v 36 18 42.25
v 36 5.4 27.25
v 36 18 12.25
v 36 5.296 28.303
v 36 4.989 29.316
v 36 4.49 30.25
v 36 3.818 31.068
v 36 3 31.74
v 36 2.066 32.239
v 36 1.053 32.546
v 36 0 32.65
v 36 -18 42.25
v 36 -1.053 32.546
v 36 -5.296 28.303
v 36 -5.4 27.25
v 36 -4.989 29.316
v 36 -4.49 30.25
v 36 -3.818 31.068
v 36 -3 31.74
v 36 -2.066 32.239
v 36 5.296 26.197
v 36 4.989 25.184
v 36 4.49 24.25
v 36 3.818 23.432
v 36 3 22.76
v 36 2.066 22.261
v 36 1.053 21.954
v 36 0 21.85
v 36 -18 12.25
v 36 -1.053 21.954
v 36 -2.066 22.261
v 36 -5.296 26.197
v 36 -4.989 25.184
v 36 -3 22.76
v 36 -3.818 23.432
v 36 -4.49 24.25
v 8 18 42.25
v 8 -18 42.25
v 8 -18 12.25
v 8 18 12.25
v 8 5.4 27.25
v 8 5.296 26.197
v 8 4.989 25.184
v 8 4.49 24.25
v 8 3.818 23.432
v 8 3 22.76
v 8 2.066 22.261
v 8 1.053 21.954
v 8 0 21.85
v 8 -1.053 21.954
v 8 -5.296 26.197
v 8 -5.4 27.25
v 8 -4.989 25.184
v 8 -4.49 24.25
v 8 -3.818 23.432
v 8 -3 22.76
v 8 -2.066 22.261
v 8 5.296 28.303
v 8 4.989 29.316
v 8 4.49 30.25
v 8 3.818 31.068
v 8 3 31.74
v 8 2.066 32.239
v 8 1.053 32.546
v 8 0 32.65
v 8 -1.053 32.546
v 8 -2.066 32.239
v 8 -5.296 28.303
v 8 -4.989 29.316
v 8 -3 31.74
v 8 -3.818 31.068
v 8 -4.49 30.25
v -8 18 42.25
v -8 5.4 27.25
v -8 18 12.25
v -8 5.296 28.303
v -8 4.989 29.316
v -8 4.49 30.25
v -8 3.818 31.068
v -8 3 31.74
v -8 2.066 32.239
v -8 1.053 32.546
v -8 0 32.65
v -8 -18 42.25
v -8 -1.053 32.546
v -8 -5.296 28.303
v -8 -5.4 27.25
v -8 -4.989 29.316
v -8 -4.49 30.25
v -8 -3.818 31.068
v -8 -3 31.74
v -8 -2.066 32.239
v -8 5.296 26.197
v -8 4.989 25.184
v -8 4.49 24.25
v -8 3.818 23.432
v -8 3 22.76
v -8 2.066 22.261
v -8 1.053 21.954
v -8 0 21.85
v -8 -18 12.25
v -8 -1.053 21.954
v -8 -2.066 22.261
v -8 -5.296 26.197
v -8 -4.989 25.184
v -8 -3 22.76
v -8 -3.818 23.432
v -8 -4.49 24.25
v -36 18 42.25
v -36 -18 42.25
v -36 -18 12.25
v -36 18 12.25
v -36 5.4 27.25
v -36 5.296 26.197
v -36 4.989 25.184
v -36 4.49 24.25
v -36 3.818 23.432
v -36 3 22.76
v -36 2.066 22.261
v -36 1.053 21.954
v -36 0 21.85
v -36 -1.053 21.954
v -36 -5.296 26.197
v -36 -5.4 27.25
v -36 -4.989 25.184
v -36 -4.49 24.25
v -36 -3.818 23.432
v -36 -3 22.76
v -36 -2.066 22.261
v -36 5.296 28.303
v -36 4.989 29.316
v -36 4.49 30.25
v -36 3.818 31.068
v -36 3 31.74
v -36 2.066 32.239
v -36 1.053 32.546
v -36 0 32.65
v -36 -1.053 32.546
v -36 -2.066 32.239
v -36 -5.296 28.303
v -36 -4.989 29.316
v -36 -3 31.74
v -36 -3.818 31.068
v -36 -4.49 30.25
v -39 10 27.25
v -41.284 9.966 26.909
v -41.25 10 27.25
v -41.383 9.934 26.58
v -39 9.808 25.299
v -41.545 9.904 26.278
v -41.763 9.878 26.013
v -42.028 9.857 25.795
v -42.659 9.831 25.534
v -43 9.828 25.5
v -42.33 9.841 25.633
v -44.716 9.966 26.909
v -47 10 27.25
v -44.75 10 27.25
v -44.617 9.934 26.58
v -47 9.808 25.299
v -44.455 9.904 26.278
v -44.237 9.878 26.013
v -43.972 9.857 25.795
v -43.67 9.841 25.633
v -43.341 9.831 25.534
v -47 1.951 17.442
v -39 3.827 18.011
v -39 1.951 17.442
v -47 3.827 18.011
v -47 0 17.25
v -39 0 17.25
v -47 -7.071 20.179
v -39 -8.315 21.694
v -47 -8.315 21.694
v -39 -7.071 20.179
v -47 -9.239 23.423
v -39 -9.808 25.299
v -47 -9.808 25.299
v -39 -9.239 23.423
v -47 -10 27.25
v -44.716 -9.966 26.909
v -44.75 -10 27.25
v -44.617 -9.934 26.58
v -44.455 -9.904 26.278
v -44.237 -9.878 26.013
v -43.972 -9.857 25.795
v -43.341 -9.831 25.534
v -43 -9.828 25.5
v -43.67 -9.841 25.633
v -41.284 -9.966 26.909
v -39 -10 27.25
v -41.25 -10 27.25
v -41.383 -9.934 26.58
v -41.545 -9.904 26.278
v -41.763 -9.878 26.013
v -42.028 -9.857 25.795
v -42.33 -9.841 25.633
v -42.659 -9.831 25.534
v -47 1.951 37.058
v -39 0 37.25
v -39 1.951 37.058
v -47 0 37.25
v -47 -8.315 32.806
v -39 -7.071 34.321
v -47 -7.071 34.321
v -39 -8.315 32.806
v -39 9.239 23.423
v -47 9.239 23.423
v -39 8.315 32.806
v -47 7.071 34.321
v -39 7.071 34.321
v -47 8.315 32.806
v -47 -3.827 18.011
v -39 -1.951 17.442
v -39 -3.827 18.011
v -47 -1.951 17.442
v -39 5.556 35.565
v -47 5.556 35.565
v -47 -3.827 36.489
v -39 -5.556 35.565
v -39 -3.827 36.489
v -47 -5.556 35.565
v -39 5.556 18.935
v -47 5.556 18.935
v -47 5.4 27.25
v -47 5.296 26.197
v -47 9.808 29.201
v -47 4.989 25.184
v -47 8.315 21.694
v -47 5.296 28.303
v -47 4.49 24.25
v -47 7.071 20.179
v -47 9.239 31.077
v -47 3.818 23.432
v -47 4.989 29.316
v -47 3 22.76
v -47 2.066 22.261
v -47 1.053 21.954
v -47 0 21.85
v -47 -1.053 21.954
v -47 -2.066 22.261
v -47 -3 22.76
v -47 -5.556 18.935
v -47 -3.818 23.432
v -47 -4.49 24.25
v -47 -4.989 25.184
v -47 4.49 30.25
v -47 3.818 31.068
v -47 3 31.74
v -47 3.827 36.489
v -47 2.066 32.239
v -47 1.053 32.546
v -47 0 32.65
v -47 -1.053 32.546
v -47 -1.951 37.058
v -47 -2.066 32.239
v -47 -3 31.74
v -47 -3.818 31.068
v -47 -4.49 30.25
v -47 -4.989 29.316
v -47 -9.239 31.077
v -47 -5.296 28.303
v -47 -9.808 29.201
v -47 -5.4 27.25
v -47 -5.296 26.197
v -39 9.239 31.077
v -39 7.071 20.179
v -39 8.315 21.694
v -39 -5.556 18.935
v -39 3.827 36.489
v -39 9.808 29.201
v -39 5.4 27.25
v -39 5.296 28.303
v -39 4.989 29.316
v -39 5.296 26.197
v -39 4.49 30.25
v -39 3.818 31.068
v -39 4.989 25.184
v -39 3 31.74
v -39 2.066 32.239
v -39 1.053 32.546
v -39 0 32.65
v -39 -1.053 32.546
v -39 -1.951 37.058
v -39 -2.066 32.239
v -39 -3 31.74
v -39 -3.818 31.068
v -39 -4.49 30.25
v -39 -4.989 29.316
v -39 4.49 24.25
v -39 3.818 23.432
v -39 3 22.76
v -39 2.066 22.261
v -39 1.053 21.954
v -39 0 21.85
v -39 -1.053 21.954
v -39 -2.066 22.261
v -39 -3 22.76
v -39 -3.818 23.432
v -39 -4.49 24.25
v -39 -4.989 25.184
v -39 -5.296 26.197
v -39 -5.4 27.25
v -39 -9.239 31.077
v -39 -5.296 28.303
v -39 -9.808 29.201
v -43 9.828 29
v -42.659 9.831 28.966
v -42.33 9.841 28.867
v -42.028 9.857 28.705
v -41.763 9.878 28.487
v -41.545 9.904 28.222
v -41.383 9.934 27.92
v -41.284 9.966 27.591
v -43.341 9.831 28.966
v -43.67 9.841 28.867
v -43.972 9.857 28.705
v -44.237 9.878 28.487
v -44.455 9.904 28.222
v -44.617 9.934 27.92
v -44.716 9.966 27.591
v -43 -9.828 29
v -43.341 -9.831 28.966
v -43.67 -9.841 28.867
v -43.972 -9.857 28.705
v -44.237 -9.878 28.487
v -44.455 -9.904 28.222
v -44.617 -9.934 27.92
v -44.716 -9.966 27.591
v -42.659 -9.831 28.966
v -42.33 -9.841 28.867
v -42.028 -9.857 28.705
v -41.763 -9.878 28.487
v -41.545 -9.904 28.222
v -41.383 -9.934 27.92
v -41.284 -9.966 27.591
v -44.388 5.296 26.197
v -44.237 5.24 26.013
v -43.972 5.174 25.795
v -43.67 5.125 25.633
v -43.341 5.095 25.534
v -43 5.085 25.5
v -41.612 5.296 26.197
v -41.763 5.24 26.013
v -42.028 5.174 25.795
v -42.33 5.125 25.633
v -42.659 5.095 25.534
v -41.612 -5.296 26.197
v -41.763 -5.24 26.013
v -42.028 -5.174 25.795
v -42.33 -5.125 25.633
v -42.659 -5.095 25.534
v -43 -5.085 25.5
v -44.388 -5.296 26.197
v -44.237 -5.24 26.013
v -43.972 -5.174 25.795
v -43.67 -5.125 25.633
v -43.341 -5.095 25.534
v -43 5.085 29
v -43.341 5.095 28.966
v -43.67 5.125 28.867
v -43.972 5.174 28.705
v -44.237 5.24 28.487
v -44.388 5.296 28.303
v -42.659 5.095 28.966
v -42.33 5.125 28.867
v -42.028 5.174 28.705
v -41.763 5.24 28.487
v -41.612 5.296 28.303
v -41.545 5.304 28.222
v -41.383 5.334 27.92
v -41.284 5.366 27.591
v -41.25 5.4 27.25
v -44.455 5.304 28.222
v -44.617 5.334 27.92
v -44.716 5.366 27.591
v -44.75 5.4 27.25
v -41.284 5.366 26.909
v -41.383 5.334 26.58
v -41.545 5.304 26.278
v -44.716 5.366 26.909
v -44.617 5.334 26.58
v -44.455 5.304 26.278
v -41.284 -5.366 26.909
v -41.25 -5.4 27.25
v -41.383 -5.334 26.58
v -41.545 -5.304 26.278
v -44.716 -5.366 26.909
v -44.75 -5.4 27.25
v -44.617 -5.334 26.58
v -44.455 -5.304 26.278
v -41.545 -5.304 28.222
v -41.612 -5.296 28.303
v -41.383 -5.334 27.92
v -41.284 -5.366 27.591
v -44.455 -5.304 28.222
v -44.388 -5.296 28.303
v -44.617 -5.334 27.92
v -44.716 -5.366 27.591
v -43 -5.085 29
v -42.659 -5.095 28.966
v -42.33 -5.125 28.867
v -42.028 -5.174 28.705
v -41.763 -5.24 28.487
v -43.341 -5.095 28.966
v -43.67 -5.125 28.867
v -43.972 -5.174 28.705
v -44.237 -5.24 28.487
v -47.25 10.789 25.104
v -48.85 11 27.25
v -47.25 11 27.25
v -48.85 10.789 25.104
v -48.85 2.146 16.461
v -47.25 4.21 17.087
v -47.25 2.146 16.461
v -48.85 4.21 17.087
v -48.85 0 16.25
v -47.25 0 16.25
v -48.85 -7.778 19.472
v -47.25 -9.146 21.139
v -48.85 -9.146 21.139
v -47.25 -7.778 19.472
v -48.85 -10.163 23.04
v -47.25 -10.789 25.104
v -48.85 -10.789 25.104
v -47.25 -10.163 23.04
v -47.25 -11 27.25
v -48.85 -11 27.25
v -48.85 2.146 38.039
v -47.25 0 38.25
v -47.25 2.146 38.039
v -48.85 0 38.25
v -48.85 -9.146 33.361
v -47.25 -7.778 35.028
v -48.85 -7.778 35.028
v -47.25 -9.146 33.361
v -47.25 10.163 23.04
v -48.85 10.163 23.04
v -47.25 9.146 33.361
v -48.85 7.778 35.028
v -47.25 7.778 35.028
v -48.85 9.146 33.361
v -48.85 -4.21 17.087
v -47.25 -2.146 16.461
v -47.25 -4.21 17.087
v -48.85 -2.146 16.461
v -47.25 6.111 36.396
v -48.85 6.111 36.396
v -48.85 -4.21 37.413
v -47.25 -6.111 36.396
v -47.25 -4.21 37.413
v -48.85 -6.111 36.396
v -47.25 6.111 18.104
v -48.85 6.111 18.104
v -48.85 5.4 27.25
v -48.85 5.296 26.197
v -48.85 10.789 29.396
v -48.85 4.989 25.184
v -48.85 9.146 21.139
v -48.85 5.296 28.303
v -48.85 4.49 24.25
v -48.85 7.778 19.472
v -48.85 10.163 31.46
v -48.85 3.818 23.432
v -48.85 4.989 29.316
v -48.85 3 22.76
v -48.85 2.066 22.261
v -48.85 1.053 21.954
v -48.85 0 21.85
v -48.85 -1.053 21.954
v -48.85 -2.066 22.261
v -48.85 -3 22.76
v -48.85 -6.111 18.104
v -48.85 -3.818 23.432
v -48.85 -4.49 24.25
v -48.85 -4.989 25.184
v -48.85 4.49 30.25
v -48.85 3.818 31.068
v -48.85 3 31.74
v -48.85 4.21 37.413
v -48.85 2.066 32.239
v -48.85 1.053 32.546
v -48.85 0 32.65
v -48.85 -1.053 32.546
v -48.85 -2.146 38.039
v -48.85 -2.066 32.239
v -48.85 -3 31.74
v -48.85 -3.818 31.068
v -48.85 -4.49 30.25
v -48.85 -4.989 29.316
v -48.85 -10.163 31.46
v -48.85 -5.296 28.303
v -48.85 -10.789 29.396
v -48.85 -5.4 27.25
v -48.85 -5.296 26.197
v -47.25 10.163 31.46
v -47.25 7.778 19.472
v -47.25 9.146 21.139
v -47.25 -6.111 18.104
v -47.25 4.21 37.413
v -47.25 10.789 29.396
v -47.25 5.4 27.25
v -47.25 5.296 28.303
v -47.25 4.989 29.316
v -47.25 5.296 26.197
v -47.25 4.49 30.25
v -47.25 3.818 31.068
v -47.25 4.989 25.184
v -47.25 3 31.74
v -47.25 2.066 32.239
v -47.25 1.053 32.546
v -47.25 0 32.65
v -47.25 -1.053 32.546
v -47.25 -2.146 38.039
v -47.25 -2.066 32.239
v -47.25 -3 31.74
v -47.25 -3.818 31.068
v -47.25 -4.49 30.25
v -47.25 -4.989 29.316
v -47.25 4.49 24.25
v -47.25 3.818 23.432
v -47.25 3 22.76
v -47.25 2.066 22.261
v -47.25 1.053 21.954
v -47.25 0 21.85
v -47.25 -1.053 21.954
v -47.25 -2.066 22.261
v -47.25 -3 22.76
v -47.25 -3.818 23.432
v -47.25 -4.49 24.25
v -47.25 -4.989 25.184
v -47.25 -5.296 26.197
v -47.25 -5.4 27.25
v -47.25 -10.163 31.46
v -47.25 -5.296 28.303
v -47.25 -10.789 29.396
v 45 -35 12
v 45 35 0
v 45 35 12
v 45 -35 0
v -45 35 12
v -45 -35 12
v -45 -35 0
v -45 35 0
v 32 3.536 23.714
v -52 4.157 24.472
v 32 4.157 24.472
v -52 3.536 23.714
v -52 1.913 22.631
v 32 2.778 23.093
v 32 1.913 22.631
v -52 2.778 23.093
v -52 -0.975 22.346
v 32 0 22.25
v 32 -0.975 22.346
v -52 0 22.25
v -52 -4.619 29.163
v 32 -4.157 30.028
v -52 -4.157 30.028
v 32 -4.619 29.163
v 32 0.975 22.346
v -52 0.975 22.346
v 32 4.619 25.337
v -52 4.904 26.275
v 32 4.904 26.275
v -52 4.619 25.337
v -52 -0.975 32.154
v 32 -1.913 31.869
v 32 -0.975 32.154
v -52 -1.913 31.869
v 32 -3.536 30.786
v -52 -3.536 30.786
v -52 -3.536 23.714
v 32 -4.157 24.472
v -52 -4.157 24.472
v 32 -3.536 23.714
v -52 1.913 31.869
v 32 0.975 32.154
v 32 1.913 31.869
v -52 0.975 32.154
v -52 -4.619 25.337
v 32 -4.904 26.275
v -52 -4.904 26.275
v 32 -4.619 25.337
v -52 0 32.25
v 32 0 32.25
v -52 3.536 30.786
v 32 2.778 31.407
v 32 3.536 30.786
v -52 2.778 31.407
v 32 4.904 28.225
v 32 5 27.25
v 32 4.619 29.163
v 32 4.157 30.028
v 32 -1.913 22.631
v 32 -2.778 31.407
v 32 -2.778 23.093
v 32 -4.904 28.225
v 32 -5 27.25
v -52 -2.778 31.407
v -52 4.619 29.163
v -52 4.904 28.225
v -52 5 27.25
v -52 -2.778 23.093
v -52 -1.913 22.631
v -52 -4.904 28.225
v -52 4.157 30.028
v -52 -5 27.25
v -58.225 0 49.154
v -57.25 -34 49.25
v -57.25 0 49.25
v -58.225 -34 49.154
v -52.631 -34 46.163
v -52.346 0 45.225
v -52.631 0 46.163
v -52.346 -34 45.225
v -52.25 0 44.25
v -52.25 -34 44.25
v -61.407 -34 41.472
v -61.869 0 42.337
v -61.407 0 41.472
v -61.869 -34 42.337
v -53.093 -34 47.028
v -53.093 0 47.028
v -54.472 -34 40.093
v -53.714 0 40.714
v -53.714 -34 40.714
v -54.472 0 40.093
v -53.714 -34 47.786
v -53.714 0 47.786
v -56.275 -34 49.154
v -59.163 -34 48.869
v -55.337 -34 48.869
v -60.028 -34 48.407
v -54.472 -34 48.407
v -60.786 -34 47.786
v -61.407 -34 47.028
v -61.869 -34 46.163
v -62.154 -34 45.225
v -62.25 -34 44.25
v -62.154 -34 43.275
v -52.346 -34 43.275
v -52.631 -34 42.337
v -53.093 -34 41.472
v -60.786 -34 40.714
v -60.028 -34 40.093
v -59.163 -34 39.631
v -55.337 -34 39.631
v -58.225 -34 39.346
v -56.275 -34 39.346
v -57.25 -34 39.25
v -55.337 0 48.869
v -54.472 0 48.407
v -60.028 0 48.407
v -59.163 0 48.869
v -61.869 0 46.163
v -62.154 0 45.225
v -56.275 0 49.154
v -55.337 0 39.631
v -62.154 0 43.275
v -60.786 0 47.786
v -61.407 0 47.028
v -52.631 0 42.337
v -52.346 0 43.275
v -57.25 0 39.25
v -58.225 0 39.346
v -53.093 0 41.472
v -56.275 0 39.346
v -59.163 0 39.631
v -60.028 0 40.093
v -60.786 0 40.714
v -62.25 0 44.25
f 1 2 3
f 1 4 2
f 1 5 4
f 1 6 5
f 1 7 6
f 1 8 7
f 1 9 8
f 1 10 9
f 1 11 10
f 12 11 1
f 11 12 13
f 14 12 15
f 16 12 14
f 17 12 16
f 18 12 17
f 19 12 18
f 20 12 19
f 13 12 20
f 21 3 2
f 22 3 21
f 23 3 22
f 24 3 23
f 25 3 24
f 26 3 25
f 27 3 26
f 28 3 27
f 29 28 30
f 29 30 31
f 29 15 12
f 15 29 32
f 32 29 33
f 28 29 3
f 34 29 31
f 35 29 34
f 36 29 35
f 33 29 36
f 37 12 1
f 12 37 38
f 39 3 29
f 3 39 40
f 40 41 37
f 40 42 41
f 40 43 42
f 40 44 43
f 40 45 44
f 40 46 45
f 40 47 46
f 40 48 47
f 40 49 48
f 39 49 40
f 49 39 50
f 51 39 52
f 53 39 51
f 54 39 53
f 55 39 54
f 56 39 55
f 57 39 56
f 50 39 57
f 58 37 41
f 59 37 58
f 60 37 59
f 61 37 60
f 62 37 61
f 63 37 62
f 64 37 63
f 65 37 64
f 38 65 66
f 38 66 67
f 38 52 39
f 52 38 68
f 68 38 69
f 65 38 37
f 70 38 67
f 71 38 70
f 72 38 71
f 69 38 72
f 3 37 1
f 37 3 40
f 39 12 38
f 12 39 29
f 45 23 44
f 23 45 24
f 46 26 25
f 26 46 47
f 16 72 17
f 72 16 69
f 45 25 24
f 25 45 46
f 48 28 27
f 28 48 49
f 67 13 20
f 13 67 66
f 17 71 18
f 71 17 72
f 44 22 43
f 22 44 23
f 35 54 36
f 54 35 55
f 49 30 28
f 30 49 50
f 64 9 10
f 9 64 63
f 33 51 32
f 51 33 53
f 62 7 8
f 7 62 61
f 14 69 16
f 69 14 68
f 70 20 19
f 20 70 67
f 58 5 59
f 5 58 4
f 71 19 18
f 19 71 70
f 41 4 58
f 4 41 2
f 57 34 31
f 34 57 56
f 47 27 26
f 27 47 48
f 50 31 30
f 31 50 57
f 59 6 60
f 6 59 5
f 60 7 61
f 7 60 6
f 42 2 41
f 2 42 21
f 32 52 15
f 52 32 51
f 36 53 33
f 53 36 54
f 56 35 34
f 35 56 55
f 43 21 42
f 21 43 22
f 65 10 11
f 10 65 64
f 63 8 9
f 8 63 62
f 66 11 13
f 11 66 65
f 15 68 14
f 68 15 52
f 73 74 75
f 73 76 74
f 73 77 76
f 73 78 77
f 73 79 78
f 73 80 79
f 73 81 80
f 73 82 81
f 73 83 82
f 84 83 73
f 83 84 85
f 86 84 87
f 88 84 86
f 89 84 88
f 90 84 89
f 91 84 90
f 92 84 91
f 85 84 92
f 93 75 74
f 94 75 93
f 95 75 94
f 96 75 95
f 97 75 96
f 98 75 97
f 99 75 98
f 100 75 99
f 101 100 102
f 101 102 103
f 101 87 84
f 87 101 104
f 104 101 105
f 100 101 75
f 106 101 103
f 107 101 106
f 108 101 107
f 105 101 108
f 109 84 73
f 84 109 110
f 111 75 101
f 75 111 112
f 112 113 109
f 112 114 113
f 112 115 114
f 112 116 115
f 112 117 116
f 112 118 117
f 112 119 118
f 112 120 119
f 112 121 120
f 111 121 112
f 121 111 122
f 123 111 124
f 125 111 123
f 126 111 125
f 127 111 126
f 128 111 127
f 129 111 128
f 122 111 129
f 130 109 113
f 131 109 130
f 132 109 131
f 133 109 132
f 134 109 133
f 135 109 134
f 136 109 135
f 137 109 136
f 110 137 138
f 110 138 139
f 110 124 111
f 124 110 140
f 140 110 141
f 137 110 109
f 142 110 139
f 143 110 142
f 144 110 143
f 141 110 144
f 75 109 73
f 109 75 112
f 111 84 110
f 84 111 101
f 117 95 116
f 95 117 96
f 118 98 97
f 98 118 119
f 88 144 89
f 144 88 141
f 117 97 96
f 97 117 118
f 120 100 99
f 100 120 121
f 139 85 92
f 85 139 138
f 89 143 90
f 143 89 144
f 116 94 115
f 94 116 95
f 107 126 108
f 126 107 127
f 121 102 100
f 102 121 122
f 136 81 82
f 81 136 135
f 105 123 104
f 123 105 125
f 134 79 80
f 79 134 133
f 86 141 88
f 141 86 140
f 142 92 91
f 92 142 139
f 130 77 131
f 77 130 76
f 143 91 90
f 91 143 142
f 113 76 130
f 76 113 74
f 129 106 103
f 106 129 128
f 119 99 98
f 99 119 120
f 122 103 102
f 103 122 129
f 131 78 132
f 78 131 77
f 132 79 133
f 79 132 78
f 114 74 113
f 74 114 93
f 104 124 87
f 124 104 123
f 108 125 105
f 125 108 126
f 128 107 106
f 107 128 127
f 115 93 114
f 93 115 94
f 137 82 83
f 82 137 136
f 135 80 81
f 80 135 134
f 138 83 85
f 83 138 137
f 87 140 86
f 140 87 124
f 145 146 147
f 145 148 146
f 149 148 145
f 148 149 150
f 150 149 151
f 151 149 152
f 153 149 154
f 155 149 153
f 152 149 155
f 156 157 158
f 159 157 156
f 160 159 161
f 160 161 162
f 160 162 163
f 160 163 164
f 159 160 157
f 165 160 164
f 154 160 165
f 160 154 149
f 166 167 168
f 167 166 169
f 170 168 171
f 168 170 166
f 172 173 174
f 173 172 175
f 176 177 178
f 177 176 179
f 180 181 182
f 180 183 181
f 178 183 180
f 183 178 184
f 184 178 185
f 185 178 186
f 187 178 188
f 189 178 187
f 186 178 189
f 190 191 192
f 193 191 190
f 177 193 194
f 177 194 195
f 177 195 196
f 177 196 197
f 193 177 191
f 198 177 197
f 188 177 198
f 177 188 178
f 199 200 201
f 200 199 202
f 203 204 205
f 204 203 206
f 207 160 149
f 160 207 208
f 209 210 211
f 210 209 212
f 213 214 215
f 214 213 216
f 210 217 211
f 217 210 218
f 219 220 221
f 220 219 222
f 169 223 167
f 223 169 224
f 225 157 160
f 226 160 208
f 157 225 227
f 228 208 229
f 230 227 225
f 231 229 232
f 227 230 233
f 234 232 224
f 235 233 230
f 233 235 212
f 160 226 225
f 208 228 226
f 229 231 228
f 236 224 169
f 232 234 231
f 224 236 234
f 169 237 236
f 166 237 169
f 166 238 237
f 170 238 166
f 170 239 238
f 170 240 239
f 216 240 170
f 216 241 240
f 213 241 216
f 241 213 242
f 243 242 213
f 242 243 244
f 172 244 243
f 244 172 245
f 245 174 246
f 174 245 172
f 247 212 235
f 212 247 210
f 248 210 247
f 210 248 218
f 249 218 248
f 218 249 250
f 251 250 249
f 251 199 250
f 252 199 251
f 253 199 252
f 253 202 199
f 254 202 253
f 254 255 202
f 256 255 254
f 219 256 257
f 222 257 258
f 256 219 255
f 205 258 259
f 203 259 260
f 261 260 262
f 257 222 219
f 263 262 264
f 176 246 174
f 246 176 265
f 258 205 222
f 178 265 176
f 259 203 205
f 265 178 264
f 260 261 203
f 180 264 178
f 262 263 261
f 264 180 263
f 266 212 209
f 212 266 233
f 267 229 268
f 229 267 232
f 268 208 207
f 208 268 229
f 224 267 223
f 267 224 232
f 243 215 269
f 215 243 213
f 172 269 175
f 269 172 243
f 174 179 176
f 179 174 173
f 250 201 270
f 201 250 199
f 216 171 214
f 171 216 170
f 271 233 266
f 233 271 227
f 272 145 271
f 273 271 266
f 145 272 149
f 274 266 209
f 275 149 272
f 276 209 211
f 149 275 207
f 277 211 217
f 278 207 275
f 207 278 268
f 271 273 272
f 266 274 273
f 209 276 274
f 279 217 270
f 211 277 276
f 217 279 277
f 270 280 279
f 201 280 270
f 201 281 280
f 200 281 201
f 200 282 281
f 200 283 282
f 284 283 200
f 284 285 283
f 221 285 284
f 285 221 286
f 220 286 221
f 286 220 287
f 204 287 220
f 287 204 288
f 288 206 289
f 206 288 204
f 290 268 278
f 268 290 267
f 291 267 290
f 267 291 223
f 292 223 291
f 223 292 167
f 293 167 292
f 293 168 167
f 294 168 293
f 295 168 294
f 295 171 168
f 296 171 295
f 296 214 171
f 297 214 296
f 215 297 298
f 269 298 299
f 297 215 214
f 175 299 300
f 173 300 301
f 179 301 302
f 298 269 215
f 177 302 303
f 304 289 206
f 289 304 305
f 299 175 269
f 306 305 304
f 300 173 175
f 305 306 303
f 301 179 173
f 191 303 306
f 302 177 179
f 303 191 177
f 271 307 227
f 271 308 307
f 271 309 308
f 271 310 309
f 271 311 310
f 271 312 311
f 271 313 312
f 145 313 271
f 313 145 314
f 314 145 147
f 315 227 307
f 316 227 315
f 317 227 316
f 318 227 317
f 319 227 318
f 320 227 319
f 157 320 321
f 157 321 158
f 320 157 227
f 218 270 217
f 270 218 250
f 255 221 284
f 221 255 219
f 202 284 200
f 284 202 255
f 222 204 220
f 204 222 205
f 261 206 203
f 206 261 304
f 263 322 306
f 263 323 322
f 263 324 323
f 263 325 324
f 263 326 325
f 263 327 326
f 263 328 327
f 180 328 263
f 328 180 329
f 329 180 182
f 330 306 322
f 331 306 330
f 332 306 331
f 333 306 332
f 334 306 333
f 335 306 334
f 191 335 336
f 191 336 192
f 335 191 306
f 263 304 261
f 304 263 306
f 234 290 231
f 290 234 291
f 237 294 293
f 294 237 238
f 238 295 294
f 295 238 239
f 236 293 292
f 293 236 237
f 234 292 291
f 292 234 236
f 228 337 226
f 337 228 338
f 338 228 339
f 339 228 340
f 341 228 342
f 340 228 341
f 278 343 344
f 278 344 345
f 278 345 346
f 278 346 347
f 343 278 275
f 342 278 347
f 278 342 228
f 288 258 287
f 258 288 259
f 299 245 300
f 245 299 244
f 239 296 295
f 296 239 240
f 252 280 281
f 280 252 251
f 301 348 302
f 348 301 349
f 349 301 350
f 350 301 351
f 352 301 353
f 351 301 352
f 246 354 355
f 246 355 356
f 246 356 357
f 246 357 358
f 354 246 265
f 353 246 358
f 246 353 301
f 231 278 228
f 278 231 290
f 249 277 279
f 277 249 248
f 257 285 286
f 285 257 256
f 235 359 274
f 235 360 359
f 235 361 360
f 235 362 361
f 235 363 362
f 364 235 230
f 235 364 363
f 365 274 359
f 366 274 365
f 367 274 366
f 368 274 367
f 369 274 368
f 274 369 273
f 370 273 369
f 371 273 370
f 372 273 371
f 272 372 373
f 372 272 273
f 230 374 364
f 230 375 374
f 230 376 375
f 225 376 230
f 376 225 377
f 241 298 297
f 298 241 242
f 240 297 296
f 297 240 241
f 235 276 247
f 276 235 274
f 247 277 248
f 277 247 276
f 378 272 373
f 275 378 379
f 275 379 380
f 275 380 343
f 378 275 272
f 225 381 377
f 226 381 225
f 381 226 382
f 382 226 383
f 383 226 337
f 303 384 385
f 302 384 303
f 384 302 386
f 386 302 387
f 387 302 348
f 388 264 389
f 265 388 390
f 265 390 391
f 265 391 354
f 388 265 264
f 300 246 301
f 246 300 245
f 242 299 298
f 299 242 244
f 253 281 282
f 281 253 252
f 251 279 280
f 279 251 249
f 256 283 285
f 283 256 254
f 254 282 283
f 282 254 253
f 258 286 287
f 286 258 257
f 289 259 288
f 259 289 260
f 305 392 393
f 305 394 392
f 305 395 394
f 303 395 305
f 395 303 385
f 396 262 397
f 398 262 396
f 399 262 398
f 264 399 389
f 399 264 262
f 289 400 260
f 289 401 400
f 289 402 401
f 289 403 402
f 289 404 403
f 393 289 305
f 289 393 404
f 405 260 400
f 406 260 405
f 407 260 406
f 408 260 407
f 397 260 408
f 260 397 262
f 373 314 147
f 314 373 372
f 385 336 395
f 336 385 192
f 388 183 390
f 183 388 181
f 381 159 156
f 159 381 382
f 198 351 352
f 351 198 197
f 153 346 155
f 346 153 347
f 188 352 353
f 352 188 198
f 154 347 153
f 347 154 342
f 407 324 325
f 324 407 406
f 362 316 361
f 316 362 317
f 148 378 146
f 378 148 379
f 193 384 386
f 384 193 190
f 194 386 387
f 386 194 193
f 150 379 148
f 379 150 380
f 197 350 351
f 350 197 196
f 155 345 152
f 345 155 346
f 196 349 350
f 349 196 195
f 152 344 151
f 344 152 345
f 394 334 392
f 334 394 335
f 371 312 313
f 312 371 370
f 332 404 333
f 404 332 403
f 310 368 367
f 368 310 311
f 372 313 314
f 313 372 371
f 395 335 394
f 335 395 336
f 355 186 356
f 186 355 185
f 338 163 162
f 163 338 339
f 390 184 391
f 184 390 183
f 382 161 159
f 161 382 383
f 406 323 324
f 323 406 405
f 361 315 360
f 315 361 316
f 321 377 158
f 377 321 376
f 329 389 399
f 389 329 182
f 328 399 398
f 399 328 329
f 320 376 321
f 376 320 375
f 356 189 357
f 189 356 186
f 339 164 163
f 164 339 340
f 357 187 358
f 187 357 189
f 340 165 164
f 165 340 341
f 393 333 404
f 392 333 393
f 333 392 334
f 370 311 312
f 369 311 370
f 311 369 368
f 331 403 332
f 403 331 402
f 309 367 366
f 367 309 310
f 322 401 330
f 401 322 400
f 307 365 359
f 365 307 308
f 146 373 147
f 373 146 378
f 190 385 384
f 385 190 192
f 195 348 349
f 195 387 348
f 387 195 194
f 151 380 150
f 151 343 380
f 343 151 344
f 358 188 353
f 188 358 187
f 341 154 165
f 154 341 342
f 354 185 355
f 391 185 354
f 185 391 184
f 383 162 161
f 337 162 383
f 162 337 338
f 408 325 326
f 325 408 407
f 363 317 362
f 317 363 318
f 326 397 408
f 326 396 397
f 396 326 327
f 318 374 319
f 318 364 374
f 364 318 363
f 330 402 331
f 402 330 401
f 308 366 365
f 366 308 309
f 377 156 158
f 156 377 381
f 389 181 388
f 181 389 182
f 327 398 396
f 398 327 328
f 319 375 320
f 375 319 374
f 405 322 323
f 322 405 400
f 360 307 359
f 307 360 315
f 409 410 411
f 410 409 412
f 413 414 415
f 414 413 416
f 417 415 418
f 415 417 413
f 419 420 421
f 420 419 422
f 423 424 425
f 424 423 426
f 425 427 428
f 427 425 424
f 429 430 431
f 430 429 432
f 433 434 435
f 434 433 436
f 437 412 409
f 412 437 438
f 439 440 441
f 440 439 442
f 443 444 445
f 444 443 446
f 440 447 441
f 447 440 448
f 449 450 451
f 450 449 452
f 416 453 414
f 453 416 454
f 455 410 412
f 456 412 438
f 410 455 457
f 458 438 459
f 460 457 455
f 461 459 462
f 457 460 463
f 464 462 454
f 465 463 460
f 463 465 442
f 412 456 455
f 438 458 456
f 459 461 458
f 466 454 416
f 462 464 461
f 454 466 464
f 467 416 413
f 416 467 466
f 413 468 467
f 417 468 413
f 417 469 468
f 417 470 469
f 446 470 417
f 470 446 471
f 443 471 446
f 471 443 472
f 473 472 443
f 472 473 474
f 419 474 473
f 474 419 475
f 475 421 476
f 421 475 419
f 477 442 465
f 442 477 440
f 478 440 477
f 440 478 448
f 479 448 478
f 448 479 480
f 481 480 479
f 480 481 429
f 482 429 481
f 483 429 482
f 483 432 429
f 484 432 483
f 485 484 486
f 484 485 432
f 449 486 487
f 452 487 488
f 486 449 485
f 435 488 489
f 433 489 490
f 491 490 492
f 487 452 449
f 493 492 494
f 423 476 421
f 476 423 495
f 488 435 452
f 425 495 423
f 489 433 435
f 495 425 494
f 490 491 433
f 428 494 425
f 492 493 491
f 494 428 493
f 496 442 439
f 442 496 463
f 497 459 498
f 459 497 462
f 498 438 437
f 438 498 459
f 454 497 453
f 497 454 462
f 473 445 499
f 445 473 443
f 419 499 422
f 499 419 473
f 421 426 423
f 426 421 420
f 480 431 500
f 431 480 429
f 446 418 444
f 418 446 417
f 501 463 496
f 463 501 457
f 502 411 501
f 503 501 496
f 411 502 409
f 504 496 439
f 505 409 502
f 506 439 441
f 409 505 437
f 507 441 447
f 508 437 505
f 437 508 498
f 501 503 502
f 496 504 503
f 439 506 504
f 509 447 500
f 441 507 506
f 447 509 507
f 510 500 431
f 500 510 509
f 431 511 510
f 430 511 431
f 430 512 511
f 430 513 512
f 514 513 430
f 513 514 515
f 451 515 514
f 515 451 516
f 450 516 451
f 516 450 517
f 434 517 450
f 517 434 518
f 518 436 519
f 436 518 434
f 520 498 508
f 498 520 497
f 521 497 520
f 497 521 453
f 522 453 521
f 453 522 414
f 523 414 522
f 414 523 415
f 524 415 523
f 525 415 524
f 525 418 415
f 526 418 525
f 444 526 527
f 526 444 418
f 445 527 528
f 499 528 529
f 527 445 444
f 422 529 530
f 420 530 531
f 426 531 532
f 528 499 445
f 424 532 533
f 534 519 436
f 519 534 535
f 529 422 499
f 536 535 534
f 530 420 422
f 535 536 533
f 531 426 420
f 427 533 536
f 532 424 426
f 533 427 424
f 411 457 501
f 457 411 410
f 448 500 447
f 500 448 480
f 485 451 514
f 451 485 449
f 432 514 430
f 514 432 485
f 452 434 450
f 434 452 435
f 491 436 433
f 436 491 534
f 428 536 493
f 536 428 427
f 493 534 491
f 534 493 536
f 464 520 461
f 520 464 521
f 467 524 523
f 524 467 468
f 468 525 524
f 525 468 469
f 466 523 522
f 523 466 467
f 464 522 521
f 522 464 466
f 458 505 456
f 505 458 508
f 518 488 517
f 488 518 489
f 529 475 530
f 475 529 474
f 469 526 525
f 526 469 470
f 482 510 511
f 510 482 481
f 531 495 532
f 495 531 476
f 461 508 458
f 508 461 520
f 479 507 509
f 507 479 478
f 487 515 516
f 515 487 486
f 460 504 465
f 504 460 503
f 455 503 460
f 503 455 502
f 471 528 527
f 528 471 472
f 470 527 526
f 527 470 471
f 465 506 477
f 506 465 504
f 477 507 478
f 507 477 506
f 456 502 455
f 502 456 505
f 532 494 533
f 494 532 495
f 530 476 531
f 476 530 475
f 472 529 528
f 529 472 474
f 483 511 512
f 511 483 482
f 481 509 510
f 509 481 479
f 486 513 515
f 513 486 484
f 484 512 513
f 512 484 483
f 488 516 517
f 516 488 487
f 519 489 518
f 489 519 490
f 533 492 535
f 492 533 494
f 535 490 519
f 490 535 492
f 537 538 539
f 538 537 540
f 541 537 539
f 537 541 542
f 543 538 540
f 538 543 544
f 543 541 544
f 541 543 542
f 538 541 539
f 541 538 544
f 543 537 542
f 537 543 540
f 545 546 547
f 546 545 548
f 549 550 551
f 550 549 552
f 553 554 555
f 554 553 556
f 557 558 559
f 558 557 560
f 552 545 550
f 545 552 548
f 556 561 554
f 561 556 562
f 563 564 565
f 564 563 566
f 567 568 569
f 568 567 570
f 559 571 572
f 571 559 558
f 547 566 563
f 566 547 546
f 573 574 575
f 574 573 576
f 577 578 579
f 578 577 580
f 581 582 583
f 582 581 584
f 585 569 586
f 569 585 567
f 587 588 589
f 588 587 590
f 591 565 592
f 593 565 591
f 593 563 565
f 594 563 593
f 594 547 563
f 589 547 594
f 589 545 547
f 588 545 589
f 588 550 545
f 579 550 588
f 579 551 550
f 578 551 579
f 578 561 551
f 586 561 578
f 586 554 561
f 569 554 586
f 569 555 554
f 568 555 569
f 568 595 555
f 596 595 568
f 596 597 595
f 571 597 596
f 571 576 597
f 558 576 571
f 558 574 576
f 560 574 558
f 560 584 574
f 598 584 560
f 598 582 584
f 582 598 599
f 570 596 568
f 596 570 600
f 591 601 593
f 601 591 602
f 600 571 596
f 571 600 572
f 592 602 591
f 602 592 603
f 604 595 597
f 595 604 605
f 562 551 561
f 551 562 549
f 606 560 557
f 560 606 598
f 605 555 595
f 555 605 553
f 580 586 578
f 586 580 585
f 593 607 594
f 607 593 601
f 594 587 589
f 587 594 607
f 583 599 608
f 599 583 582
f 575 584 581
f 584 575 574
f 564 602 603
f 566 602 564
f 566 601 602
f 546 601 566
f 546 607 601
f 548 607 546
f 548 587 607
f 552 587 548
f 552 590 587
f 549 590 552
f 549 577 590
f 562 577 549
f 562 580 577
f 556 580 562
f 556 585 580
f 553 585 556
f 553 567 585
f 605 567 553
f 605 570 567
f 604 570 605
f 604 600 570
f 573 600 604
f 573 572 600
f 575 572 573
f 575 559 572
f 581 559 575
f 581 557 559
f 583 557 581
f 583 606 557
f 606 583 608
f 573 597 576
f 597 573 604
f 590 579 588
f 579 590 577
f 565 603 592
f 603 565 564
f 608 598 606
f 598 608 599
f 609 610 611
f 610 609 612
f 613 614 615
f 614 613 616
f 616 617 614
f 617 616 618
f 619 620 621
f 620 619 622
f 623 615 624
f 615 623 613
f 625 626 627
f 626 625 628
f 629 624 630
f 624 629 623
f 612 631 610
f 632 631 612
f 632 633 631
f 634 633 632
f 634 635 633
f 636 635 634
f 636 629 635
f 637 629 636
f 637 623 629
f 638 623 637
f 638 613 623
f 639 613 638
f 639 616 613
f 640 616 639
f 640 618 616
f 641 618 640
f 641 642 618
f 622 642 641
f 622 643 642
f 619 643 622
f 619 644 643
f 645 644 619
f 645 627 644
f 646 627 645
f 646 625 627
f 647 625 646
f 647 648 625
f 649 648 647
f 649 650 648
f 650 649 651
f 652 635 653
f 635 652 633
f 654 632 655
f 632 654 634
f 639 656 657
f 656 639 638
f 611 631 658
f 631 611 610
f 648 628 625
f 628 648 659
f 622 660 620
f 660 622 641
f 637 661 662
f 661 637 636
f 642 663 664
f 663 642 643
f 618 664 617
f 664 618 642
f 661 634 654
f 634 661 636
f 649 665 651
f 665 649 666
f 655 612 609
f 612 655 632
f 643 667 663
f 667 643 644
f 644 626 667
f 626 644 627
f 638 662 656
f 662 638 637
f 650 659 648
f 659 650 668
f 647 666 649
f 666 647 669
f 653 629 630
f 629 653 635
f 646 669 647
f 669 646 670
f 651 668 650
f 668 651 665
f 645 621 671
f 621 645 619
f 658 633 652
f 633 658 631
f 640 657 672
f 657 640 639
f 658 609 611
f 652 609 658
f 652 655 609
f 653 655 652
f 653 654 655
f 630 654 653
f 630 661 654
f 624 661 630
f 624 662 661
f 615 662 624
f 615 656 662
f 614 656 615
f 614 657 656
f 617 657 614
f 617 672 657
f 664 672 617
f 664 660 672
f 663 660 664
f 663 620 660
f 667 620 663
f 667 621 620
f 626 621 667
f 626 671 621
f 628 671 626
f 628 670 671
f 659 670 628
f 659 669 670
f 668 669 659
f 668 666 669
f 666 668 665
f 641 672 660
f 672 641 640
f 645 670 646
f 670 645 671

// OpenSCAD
$fn = 32;

// ------------------------------------------------------------------------
// Machine vise: screw d10, jaws 28 x 30 mm
// Every part is its own module, assembly() places every instance.
// ------------------------------------------------------------------------

// --- part 1 ---
module vise_bed() {
  difference() {
    translate([-45, -35, 0]) cube([90, 70, 12]);
  }
}

// --- part 2 ---
module vise_jaw() {
  difference() {
    translate([-14, -18, 0]) cube([28, 36, 30]);
    translate([0, 0, 15]) rotate([0, 90, 0]) cylinder(h = 30, d = 10.8, center = true);
  }
}

// --- part 3 ---
module vise_screw() {
  translate([0, 0, -42]) cylinder(h = 84, d = 10);
}

// --- part 4 ---
module screw_collar() {
  difference() {
    cylinder(h = 8, d = 20);
    translate([0, 0, -1]) cylinder(h = 10, d = 10.8);
    translate([0, 0, 4]) rotate([90, 0, 0]) cylinder(h = 22, d = 3.5, center = true);
  }
}

// --- part 5 ---
module screw_washer() {
  difference() {
      translate([0, 0, 0]) cylinder(h = 1.6, d = 22);
      translate([0, 0, -1]) cylinder(h = 3.6, d = 10.8);
    }
}

// --- part 6 ---
module vise_handle() {
  cylinder(h = 34, d = 10);
}

// --- assembly ---
module assembly() {
  color([0.80, 0.24, 0.20]) translate([0, 0, 0]) rotate([0, 0, 0]) vise_bed();
  color([0.20, 0.45, 0.75]) translate([22, 0, 12.25]) rotate([0, 0, 0]) vise_jaw();
  color([0.25, 0.62, 0.32]) translate([-22, 0, 12.25]) rotate([0, 0, 0]) vise_jaw();
  color([0.92, 0.70, 0.18]) translate([-10, 0, 27.25]) rotate([0, 90, 0]) vise_screw();
  color([0.58, 0.35, 0.70]) translate([-47, 0, 27.25]) rotate([0, 90, 0]) screw_collar();
  color([0.16, 0.66, 0.66]) translate([-48.85, 0, 27.25]) rotate([0, 90, 0]) screw_washer();
  color([0.85, 0.48, 0.18]) translate([-57.25, 0, 44.25]) rotate([90, 0, 0]) vise_handle();
}

assembly();
